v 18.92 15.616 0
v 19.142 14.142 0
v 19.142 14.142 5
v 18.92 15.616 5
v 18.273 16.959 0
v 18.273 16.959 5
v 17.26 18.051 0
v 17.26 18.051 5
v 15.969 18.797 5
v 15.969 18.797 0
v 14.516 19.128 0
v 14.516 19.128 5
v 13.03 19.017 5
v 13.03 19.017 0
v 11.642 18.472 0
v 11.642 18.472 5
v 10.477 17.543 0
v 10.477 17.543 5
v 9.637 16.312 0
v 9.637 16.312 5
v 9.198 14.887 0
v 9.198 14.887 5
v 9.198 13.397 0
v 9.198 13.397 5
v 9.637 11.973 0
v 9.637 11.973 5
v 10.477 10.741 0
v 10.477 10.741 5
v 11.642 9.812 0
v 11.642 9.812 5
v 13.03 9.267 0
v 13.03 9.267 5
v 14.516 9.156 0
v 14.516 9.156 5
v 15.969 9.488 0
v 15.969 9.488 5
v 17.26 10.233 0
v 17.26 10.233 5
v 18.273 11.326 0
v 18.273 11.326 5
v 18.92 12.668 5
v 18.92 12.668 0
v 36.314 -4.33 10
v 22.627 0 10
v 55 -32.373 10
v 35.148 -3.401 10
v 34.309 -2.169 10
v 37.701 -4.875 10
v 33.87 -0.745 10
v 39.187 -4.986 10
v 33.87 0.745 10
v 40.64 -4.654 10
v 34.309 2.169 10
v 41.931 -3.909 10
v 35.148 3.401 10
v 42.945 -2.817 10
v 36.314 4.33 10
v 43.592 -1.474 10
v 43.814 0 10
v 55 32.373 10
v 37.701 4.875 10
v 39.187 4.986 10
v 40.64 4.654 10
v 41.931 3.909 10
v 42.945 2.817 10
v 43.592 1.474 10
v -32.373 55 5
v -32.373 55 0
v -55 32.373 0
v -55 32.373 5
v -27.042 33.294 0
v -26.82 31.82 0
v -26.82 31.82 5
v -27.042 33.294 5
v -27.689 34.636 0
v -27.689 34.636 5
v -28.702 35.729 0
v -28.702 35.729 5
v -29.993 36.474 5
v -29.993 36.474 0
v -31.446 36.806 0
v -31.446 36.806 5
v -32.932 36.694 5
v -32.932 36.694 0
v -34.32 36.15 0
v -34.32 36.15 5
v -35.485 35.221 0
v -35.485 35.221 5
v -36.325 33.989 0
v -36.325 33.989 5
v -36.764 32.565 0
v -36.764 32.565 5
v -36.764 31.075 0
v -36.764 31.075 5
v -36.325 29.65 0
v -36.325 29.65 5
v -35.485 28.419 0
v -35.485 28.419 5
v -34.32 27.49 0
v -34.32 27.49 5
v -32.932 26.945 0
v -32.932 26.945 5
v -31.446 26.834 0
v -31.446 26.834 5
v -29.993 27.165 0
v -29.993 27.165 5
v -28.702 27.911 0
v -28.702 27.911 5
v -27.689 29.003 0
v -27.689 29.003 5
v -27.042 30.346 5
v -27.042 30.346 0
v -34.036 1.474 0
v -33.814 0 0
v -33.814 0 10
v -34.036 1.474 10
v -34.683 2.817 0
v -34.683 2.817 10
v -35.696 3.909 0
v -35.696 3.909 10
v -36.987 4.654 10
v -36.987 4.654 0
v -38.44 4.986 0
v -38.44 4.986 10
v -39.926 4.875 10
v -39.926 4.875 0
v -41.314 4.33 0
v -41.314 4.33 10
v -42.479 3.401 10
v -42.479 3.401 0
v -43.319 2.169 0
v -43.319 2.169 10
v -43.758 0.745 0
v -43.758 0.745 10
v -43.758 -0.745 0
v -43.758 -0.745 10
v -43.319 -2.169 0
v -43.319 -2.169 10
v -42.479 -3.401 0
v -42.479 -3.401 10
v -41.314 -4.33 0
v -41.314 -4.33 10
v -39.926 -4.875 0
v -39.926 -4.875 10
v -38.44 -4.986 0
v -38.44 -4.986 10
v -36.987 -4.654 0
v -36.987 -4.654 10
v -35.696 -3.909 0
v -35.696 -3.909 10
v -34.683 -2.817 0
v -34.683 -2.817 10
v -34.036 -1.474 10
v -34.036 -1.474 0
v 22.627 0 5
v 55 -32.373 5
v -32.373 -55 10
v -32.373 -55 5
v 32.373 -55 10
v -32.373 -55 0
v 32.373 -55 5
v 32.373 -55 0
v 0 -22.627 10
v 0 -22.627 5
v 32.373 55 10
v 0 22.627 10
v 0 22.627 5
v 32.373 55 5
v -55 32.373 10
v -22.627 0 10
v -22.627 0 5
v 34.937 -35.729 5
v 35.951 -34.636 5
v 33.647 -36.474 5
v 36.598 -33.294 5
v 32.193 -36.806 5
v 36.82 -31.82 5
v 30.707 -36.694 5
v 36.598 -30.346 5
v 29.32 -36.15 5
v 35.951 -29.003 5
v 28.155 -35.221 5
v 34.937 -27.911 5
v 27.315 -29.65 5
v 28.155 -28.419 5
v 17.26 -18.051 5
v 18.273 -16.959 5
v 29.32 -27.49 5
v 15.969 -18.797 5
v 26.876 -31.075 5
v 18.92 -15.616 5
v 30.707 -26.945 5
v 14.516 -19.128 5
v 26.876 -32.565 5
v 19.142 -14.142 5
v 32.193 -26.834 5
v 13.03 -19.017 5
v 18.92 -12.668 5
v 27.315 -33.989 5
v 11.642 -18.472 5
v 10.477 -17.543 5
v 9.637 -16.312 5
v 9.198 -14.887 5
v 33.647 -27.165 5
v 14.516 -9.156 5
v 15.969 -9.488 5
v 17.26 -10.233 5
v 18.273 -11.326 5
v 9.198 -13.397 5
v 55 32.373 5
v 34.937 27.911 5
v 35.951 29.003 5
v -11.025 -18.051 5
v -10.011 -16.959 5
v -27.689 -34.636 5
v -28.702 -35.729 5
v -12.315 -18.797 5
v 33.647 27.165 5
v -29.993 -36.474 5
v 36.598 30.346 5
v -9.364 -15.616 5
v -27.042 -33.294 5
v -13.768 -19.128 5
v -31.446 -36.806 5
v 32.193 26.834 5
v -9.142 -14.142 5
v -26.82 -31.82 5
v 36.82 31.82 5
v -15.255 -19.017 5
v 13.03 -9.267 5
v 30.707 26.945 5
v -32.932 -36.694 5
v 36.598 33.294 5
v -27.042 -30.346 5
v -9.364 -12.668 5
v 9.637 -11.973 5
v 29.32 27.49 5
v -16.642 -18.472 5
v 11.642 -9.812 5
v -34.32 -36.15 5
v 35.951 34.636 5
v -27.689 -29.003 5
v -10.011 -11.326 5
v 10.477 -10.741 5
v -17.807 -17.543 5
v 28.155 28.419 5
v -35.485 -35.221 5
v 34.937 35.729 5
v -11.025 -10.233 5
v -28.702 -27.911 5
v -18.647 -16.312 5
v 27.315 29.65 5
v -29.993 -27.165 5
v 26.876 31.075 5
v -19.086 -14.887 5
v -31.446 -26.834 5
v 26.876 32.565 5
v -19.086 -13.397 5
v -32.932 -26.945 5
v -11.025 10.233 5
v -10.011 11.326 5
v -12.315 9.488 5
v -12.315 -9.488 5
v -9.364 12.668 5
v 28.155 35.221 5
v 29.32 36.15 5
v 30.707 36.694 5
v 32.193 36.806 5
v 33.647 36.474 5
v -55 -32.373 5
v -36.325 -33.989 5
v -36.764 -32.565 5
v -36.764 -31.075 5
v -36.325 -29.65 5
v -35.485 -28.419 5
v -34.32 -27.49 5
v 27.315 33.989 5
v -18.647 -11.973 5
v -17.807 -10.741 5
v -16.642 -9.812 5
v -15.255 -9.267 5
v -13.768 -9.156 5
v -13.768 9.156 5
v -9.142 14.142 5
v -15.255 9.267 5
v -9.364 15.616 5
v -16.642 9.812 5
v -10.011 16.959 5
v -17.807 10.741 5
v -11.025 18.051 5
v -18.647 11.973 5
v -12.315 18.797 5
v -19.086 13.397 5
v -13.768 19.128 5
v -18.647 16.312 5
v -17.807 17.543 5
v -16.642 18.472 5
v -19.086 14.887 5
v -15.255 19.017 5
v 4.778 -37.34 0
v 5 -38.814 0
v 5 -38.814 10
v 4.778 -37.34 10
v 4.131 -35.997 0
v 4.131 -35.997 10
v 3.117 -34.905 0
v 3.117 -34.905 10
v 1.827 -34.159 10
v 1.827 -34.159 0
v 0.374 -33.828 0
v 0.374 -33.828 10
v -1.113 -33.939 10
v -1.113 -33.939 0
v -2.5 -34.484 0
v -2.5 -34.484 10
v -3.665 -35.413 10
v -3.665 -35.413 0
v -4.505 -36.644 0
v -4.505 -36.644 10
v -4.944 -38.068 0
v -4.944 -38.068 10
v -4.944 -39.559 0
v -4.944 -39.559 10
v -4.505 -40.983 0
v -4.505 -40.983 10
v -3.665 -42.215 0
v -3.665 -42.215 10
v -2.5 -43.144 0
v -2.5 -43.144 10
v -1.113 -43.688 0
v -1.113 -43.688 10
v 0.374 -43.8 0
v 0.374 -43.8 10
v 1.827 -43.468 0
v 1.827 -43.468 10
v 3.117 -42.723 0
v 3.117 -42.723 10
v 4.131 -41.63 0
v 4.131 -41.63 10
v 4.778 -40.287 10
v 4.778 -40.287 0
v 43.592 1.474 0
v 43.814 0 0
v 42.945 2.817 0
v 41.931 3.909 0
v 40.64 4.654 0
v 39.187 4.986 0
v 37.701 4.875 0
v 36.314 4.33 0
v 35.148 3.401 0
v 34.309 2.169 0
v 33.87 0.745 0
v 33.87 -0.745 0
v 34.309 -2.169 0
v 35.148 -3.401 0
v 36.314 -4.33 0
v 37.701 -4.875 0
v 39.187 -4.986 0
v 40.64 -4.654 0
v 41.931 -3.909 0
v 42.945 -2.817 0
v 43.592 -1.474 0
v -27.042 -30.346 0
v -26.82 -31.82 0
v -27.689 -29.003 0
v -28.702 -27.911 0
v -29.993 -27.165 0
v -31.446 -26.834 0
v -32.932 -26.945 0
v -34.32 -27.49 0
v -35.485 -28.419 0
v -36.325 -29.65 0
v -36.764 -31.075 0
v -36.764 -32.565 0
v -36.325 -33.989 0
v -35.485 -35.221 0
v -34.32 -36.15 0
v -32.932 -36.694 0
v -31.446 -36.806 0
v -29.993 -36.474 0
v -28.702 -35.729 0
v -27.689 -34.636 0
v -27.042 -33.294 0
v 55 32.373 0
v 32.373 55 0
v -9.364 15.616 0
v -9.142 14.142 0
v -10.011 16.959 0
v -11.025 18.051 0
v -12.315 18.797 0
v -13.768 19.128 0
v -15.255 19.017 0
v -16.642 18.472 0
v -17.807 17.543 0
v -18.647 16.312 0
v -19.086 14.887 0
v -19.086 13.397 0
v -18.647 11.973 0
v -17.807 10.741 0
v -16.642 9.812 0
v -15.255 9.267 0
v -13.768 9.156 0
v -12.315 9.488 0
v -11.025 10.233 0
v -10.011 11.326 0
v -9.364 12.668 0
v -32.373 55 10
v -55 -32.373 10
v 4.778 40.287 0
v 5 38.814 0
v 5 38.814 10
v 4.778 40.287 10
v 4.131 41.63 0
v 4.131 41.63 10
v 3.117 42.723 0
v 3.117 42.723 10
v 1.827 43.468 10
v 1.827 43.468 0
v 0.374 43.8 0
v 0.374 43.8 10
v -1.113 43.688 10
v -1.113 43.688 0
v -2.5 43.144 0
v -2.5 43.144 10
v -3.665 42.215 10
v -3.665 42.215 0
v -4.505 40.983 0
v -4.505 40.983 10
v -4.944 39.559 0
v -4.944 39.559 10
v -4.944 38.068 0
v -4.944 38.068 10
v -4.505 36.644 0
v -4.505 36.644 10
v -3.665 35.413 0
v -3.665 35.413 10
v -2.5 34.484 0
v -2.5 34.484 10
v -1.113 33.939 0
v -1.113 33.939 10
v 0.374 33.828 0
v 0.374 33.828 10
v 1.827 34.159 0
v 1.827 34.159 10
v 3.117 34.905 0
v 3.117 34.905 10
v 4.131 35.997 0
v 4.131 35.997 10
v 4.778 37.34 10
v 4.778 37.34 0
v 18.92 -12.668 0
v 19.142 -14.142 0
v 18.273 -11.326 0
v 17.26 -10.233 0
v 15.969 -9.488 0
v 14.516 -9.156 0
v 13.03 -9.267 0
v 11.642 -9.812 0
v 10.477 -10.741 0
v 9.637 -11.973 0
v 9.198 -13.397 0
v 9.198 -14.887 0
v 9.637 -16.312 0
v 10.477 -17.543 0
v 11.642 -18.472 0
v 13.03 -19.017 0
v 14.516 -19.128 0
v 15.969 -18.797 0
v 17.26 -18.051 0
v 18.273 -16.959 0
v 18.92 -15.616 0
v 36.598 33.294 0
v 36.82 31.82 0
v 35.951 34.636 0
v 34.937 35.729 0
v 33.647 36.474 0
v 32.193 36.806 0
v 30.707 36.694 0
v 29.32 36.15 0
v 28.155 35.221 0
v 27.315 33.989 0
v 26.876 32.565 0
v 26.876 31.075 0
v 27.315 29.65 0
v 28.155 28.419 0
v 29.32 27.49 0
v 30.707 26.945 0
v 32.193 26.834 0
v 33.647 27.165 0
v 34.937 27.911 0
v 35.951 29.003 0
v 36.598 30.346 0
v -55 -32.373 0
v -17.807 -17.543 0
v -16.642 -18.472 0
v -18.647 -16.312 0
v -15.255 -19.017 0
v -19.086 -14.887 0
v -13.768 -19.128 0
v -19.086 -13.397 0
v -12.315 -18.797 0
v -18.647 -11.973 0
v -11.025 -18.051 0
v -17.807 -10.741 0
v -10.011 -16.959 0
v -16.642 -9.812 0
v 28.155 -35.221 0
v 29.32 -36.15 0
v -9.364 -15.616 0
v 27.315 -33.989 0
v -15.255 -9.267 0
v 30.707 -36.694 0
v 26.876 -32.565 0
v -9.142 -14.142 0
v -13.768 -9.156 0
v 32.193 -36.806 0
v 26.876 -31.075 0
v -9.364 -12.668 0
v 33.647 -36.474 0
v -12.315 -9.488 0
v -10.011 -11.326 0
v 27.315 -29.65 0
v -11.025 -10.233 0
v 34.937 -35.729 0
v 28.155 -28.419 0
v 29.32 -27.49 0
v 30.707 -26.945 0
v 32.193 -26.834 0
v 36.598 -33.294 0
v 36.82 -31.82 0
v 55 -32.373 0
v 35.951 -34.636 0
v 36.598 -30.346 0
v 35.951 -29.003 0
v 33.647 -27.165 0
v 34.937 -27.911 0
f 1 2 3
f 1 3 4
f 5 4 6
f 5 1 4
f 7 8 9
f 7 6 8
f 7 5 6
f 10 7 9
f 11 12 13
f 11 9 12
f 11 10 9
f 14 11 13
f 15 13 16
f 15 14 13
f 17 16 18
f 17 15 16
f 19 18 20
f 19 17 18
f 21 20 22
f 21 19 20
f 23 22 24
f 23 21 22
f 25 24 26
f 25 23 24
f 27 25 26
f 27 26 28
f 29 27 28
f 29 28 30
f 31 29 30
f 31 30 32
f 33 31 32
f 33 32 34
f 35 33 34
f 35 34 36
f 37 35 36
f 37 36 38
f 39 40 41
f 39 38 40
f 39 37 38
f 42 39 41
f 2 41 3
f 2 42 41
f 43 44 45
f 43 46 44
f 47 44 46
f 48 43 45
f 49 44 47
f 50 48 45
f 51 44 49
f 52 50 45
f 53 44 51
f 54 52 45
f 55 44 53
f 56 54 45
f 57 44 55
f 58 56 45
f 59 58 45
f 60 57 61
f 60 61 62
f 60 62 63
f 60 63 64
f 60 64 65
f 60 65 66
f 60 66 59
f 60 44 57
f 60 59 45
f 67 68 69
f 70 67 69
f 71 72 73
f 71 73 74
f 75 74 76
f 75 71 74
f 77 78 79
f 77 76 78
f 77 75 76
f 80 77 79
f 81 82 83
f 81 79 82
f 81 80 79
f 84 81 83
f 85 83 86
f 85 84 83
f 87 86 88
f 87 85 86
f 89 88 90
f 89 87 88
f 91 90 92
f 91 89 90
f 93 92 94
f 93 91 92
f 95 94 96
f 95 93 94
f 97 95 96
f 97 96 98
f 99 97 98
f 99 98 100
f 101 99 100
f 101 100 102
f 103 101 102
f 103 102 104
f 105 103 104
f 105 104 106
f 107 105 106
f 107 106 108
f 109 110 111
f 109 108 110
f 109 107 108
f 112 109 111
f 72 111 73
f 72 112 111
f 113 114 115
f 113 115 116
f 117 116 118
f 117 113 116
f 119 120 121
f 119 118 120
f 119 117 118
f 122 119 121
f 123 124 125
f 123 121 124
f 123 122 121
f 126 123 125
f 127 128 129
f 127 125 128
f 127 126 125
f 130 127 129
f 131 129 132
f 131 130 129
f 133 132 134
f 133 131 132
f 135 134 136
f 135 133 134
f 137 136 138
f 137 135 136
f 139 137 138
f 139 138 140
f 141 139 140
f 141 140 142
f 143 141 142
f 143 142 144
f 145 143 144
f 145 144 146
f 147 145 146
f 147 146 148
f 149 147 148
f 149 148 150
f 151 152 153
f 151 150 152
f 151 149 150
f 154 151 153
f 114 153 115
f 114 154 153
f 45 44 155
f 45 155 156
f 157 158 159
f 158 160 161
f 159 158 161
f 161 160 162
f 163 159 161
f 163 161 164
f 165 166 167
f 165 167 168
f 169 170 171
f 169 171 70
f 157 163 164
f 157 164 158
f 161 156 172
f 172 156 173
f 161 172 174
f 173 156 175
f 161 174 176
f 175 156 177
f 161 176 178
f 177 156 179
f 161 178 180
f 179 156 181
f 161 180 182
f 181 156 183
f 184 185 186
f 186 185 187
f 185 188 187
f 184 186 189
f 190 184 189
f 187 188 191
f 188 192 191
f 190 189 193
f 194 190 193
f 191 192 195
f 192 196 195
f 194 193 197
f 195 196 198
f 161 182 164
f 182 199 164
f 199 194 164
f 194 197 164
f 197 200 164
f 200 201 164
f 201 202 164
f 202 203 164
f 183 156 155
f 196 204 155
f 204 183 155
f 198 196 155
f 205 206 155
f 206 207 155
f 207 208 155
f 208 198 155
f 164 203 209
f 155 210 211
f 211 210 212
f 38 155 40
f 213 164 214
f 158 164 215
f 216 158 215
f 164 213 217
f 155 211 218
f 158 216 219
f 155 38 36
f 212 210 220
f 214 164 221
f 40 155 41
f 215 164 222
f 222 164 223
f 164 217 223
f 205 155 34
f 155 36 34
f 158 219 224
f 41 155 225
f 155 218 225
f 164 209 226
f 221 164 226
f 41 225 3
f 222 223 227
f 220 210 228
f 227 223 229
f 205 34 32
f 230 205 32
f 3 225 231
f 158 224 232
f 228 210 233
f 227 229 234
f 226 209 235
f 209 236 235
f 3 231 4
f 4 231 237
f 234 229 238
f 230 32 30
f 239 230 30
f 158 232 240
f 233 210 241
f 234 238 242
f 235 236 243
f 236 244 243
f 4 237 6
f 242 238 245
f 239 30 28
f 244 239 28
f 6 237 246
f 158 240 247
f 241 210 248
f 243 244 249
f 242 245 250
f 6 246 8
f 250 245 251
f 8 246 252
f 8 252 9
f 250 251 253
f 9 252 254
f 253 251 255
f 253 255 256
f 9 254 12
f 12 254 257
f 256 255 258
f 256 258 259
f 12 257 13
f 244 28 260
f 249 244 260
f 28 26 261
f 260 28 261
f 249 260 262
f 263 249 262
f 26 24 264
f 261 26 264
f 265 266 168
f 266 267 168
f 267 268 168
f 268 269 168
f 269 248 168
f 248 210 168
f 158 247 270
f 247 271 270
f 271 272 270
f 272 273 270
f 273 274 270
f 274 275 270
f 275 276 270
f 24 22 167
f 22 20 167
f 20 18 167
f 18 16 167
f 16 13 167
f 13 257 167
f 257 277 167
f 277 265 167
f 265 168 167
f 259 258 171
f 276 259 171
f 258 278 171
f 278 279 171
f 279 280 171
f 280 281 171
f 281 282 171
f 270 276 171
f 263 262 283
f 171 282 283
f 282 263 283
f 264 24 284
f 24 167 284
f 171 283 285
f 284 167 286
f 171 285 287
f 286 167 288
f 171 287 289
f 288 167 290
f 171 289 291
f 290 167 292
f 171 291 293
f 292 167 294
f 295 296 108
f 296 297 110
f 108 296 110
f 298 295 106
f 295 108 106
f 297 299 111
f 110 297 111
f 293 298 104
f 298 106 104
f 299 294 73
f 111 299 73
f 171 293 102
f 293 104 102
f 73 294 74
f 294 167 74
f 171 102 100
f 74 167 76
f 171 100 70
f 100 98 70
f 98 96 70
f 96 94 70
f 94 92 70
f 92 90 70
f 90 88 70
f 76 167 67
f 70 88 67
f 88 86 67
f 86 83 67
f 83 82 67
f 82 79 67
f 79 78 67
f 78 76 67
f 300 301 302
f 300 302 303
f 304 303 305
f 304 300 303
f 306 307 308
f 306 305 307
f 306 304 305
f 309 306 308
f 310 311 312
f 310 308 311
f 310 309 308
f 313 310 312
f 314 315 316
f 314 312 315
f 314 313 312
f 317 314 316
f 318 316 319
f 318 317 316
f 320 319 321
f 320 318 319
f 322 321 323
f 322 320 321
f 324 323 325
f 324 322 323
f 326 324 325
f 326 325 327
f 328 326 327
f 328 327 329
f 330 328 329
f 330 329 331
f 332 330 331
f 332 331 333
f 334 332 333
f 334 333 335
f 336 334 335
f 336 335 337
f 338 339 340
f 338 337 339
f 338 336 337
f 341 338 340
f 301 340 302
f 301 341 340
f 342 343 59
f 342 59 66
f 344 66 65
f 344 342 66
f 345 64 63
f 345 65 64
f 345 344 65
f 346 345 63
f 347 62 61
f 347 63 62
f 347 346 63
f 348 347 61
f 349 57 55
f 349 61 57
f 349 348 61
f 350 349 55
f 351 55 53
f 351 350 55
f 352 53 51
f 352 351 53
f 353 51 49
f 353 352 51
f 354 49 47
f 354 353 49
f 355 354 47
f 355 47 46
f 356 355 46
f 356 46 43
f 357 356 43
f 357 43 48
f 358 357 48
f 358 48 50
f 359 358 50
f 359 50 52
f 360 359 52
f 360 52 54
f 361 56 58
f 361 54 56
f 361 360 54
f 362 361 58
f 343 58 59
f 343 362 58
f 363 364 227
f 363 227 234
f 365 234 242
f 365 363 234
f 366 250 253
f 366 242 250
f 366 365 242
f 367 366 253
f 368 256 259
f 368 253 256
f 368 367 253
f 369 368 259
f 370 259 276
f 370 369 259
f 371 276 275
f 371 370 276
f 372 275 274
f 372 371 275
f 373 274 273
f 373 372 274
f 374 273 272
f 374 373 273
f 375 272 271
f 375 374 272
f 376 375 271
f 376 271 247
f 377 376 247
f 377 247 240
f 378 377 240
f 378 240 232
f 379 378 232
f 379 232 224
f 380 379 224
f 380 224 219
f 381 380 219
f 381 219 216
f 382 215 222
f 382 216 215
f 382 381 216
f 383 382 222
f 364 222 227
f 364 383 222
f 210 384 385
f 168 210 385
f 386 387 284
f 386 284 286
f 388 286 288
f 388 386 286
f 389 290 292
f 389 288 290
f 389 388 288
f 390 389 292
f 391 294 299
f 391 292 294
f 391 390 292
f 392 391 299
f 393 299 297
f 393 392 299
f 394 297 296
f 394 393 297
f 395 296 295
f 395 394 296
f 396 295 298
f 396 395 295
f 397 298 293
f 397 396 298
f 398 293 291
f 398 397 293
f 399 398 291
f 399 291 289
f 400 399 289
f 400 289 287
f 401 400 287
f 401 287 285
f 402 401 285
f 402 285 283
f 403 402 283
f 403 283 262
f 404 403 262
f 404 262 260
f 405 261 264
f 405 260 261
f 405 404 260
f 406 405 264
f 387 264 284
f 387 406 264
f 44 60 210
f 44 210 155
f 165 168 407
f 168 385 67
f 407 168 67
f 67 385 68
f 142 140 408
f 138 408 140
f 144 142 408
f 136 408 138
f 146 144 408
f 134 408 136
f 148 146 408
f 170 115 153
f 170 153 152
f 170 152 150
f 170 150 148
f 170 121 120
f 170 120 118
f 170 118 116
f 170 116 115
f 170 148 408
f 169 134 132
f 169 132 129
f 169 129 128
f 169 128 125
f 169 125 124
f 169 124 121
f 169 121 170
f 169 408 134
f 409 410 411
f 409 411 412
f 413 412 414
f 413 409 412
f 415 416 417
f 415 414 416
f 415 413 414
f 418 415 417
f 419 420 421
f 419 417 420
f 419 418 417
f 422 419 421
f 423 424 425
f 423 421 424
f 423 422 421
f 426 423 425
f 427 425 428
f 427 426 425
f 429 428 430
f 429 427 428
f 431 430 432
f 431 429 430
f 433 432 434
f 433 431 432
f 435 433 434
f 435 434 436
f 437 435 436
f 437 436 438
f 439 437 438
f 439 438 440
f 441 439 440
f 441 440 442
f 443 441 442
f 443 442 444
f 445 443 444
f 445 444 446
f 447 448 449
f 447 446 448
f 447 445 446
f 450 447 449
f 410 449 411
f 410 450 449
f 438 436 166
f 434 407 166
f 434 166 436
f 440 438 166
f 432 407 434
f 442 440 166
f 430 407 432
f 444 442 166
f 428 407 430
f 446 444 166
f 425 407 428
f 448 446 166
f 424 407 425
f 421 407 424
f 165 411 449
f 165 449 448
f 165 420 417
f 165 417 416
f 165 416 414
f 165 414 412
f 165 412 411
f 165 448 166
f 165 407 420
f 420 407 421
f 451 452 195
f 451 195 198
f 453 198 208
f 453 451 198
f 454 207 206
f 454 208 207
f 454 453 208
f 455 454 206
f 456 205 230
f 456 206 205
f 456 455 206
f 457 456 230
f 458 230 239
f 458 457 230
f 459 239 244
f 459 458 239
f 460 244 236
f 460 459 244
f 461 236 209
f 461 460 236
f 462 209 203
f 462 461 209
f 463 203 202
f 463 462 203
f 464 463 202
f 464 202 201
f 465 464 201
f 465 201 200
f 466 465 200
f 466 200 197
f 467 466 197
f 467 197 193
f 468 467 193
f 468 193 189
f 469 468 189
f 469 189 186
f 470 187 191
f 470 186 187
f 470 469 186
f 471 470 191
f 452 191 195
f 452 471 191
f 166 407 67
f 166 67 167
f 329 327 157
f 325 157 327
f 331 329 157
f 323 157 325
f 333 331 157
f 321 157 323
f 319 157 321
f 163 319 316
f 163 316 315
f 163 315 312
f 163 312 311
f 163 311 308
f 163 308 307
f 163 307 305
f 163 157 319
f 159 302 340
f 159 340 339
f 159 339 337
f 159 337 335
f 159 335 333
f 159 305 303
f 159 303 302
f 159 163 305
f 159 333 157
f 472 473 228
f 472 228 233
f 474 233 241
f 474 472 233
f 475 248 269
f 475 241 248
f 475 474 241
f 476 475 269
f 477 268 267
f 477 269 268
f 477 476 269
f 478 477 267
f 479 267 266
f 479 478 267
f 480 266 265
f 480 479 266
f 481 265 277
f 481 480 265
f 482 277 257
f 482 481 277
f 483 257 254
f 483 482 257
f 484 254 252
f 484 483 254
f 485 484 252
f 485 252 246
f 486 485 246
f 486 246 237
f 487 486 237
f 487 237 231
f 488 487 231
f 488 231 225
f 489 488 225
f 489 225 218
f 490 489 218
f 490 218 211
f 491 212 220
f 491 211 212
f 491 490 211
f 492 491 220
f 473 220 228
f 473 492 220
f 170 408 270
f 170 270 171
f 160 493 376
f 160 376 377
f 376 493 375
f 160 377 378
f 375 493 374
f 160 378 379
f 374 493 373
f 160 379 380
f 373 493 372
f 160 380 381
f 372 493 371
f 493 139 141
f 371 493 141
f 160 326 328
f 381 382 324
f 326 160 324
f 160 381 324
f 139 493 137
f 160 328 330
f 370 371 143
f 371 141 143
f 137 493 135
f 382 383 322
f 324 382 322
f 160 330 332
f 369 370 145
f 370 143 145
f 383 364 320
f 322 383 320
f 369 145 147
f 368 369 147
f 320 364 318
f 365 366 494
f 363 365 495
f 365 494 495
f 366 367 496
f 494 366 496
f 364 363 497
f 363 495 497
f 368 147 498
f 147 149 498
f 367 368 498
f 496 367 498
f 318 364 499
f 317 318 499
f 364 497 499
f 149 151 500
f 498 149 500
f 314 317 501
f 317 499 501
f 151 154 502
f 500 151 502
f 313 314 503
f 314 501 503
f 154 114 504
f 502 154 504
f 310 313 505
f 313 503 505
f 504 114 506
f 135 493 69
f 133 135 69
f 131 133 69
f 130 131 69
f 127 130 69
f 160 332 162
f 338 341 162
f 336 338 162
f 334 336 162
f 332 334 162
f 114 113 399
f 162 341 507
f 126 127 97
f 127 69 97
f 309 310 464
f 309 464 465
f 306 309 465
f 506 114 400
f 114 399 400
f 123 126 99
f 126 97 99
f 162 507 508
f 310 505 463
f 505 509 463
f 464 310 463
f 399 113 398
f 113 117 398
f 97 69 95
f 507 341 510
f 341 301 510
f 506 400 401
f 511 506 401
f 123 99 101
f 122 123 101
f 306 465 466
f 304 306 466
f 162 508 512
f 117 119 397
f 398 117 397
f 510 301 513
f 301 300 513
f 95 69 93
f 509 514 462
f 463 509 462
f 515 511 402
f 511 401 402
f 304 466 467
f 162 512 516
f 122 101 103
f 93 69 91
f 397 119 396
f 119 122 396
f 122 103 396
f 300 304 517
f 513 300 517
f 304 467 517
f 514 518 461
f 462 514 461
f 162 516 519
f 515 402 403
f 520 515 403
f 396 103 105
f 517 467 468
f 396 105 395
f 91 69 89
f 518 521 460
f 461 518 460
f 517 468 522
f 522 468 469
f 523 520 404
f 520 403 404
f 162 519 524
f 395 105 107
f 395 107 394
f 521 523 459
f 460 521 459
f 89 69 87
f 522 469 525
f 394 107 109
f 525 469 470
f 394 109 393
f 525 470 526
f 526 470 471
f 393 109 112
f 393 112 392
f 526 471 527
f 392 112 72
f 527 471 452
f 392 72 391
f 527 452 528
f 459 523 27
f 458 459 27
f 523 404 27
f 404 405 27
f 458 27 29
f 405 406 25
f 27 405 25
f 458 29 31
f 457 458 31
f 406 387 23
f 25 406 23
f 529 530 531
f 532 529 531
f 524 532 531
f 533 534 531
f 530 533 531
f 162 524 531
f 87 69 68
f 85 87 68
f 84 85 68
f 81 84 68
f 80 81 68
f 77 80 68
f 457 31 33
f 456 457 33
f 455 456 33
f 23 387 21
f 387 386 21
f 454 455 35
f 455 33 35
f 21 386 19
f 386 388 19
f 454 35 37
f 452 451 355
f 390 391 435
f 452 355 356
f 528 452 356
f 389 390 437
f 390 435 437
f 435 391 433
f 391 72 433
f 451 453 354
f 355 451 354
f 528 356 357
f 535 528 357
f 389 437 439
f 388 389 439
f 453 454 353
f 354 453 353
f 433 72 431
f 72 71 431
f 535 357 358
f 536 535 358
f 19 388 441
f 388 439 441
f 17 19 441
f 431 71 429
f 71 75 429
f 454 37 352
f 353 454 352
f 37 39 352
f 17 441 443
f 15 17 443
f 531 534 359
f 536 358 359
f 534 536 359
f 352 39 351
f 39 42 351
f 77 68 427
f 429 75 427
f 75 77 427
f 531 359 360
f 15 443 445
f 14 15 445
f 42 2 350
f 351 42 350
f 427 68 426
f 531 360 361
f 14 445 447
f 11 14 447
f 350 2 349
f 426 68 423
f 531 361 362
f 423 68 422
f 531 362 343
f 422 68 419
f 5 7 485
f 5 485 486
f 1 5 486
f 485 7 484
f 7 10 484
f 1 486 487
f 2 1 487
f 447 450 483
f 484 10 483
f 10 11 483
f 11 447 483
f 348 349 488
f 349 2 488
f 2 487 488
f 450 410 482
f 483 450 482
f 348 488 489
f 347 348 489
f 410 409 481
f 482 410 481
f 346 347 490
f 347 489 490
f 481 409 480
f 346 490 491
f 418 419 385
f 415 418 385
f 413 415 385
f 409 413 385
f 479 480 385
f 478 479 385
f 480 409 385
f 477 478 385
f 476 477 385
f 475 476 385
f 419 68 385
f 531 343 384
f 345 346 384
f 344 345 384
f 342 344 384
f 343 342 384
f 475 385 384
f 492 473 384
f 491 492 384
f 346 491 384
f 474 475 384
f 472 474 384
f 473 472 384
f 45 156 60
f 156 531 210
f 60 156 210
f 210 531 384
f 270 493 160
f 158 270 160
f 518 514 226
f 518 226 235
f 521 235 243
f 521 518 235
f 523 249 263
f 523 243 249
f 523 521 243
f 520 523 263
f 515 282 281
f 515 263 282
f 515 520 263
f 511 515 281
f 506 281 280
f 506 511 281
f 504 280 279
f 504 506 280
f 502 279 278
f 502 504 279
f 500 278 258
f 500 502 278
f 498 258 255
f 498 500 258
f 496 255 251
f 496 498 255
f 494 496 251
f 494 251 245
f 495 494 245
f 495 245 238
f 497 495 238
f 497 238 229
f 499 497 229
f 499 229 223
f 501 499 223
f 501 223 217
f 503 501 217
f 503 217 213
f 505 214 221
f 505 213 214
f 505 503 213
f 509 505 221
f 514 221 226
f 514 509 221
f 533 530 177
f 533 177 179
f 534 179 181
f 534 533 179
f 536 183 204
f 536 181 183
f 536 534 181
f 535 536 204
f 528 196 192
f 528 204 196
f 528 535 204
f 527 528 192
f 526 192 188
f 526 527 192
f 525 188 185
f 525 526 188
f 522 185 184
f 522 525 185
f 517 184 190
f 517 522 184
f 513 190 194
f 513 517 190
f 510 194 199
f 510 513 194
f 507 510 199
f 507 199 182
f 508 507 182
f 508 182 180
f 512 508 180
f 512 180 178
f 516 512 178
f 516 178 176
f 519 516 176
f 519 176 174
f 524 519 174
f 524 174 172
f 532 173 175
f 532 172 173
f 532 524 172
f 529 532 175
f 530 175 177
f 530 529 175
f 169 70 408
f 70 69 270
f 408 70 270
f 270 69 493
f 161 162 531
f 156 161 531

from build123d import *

# Parameters (mm, degrees)
BOSS_EXTRU_1_DEPTH           = 10
ENL_V_MAT_EXTRU_1_DEPTH      = 5
ENL_V_MAT_EXTRU_2_DEPTH      = 78.942286341
ENL_V_MAT_EXTRU_2_DEPTH_BACK = 78.942286341
ESQUISSE4_R                  = 5


with BuildPart() as part:
    # Esquisse1 → Boss.-Extru.1 (new body)
    with BuildSketch(Plane.XY):
        Polygon((-32.372583002, 55), (-55, 32.372583002), (-55, -32.372583002), (-32.372583002, -55), (32.372583002, -55), (55, -32.372583002), (55, 32.372583002), (32.372583002, 55), align=None)
    extrude(amount=BOSS_EXTRU_1_DEPTH)

    # Esquisse3 → Enlèv. mat.-Extru.1 (cut)
    with BuildSketch(Plane.XY.offset(10)):
        Polygon((-55, 32.372583002), (-32.372583002, 55), (0, 22.627416998), (32.372583002, 55), (55, 32.372583002), (22.627416998, 0), (55, -32.372583002), (32.372583002, -55), (0, -22.627416998), (-32.372583002, -55), (-55, -32.372583002), (-22.627416998, 0), align=None)
    extrude(amount=-ENL_V_MAT_EXTRU_1_DEPTH, mode=Mode.SUBTRACT)

    # Esquisse4 → Enlèv. mat.-Extru.2 (cut, two sides: drawn at the far end of the back side and taken through both)
    with BuildSketch(Plane.XY.offset(5).offset(-ENL_V_MAT_EXTRU_2_DEPTH_BACK)):
        with Locations((-31.819805153, 31.819805153)):
            Circle(ESQUISSE4_R)
        with Locations((-14.142135624, 14.142135624)):
            Circle(ESQUISSE4_R)
        with Locations((31.819805153, 31.819805153)):
            Circle(ESQUISSE4_R)
        with Locations((14.142135624, 14.142135624)):
            Circle(ESQUISSE4_R)
        with Locations((31.819805153, -31.819805153)):
            Circle(ESQUISSE4_R)
        with Locations((14.142135624, -14.142135624)):
            Circle(ESQUISSE4_R)
        with Locations((-31.819805153, -31.819805153)):
            Circle(ESQUISSE4_R)
        with Locations((-14.142135624, -14.142135624)):
            Circle(ESQUISSE4_R)
        with Locations((0, 38.813708499)):
            Circle(ESQUISSE4_R)
        with Locations((38.813708499, 0)):
            Circle(ESQUISSE4_R)
        with Locations((0, -38.813708499)):
            Circle(ESQUISSE4_R)
        with Locations((-38.813708499, 0)):
            Circle(ESQUISSE4_R)
    extrude(amount=ENL_V_MAT_EXTRU_2_DEPTH + ENL_V_MAT_EXTRU_2_DEPTH_BACK, mode=Mode.SUBTRACT)


solid = part.part
